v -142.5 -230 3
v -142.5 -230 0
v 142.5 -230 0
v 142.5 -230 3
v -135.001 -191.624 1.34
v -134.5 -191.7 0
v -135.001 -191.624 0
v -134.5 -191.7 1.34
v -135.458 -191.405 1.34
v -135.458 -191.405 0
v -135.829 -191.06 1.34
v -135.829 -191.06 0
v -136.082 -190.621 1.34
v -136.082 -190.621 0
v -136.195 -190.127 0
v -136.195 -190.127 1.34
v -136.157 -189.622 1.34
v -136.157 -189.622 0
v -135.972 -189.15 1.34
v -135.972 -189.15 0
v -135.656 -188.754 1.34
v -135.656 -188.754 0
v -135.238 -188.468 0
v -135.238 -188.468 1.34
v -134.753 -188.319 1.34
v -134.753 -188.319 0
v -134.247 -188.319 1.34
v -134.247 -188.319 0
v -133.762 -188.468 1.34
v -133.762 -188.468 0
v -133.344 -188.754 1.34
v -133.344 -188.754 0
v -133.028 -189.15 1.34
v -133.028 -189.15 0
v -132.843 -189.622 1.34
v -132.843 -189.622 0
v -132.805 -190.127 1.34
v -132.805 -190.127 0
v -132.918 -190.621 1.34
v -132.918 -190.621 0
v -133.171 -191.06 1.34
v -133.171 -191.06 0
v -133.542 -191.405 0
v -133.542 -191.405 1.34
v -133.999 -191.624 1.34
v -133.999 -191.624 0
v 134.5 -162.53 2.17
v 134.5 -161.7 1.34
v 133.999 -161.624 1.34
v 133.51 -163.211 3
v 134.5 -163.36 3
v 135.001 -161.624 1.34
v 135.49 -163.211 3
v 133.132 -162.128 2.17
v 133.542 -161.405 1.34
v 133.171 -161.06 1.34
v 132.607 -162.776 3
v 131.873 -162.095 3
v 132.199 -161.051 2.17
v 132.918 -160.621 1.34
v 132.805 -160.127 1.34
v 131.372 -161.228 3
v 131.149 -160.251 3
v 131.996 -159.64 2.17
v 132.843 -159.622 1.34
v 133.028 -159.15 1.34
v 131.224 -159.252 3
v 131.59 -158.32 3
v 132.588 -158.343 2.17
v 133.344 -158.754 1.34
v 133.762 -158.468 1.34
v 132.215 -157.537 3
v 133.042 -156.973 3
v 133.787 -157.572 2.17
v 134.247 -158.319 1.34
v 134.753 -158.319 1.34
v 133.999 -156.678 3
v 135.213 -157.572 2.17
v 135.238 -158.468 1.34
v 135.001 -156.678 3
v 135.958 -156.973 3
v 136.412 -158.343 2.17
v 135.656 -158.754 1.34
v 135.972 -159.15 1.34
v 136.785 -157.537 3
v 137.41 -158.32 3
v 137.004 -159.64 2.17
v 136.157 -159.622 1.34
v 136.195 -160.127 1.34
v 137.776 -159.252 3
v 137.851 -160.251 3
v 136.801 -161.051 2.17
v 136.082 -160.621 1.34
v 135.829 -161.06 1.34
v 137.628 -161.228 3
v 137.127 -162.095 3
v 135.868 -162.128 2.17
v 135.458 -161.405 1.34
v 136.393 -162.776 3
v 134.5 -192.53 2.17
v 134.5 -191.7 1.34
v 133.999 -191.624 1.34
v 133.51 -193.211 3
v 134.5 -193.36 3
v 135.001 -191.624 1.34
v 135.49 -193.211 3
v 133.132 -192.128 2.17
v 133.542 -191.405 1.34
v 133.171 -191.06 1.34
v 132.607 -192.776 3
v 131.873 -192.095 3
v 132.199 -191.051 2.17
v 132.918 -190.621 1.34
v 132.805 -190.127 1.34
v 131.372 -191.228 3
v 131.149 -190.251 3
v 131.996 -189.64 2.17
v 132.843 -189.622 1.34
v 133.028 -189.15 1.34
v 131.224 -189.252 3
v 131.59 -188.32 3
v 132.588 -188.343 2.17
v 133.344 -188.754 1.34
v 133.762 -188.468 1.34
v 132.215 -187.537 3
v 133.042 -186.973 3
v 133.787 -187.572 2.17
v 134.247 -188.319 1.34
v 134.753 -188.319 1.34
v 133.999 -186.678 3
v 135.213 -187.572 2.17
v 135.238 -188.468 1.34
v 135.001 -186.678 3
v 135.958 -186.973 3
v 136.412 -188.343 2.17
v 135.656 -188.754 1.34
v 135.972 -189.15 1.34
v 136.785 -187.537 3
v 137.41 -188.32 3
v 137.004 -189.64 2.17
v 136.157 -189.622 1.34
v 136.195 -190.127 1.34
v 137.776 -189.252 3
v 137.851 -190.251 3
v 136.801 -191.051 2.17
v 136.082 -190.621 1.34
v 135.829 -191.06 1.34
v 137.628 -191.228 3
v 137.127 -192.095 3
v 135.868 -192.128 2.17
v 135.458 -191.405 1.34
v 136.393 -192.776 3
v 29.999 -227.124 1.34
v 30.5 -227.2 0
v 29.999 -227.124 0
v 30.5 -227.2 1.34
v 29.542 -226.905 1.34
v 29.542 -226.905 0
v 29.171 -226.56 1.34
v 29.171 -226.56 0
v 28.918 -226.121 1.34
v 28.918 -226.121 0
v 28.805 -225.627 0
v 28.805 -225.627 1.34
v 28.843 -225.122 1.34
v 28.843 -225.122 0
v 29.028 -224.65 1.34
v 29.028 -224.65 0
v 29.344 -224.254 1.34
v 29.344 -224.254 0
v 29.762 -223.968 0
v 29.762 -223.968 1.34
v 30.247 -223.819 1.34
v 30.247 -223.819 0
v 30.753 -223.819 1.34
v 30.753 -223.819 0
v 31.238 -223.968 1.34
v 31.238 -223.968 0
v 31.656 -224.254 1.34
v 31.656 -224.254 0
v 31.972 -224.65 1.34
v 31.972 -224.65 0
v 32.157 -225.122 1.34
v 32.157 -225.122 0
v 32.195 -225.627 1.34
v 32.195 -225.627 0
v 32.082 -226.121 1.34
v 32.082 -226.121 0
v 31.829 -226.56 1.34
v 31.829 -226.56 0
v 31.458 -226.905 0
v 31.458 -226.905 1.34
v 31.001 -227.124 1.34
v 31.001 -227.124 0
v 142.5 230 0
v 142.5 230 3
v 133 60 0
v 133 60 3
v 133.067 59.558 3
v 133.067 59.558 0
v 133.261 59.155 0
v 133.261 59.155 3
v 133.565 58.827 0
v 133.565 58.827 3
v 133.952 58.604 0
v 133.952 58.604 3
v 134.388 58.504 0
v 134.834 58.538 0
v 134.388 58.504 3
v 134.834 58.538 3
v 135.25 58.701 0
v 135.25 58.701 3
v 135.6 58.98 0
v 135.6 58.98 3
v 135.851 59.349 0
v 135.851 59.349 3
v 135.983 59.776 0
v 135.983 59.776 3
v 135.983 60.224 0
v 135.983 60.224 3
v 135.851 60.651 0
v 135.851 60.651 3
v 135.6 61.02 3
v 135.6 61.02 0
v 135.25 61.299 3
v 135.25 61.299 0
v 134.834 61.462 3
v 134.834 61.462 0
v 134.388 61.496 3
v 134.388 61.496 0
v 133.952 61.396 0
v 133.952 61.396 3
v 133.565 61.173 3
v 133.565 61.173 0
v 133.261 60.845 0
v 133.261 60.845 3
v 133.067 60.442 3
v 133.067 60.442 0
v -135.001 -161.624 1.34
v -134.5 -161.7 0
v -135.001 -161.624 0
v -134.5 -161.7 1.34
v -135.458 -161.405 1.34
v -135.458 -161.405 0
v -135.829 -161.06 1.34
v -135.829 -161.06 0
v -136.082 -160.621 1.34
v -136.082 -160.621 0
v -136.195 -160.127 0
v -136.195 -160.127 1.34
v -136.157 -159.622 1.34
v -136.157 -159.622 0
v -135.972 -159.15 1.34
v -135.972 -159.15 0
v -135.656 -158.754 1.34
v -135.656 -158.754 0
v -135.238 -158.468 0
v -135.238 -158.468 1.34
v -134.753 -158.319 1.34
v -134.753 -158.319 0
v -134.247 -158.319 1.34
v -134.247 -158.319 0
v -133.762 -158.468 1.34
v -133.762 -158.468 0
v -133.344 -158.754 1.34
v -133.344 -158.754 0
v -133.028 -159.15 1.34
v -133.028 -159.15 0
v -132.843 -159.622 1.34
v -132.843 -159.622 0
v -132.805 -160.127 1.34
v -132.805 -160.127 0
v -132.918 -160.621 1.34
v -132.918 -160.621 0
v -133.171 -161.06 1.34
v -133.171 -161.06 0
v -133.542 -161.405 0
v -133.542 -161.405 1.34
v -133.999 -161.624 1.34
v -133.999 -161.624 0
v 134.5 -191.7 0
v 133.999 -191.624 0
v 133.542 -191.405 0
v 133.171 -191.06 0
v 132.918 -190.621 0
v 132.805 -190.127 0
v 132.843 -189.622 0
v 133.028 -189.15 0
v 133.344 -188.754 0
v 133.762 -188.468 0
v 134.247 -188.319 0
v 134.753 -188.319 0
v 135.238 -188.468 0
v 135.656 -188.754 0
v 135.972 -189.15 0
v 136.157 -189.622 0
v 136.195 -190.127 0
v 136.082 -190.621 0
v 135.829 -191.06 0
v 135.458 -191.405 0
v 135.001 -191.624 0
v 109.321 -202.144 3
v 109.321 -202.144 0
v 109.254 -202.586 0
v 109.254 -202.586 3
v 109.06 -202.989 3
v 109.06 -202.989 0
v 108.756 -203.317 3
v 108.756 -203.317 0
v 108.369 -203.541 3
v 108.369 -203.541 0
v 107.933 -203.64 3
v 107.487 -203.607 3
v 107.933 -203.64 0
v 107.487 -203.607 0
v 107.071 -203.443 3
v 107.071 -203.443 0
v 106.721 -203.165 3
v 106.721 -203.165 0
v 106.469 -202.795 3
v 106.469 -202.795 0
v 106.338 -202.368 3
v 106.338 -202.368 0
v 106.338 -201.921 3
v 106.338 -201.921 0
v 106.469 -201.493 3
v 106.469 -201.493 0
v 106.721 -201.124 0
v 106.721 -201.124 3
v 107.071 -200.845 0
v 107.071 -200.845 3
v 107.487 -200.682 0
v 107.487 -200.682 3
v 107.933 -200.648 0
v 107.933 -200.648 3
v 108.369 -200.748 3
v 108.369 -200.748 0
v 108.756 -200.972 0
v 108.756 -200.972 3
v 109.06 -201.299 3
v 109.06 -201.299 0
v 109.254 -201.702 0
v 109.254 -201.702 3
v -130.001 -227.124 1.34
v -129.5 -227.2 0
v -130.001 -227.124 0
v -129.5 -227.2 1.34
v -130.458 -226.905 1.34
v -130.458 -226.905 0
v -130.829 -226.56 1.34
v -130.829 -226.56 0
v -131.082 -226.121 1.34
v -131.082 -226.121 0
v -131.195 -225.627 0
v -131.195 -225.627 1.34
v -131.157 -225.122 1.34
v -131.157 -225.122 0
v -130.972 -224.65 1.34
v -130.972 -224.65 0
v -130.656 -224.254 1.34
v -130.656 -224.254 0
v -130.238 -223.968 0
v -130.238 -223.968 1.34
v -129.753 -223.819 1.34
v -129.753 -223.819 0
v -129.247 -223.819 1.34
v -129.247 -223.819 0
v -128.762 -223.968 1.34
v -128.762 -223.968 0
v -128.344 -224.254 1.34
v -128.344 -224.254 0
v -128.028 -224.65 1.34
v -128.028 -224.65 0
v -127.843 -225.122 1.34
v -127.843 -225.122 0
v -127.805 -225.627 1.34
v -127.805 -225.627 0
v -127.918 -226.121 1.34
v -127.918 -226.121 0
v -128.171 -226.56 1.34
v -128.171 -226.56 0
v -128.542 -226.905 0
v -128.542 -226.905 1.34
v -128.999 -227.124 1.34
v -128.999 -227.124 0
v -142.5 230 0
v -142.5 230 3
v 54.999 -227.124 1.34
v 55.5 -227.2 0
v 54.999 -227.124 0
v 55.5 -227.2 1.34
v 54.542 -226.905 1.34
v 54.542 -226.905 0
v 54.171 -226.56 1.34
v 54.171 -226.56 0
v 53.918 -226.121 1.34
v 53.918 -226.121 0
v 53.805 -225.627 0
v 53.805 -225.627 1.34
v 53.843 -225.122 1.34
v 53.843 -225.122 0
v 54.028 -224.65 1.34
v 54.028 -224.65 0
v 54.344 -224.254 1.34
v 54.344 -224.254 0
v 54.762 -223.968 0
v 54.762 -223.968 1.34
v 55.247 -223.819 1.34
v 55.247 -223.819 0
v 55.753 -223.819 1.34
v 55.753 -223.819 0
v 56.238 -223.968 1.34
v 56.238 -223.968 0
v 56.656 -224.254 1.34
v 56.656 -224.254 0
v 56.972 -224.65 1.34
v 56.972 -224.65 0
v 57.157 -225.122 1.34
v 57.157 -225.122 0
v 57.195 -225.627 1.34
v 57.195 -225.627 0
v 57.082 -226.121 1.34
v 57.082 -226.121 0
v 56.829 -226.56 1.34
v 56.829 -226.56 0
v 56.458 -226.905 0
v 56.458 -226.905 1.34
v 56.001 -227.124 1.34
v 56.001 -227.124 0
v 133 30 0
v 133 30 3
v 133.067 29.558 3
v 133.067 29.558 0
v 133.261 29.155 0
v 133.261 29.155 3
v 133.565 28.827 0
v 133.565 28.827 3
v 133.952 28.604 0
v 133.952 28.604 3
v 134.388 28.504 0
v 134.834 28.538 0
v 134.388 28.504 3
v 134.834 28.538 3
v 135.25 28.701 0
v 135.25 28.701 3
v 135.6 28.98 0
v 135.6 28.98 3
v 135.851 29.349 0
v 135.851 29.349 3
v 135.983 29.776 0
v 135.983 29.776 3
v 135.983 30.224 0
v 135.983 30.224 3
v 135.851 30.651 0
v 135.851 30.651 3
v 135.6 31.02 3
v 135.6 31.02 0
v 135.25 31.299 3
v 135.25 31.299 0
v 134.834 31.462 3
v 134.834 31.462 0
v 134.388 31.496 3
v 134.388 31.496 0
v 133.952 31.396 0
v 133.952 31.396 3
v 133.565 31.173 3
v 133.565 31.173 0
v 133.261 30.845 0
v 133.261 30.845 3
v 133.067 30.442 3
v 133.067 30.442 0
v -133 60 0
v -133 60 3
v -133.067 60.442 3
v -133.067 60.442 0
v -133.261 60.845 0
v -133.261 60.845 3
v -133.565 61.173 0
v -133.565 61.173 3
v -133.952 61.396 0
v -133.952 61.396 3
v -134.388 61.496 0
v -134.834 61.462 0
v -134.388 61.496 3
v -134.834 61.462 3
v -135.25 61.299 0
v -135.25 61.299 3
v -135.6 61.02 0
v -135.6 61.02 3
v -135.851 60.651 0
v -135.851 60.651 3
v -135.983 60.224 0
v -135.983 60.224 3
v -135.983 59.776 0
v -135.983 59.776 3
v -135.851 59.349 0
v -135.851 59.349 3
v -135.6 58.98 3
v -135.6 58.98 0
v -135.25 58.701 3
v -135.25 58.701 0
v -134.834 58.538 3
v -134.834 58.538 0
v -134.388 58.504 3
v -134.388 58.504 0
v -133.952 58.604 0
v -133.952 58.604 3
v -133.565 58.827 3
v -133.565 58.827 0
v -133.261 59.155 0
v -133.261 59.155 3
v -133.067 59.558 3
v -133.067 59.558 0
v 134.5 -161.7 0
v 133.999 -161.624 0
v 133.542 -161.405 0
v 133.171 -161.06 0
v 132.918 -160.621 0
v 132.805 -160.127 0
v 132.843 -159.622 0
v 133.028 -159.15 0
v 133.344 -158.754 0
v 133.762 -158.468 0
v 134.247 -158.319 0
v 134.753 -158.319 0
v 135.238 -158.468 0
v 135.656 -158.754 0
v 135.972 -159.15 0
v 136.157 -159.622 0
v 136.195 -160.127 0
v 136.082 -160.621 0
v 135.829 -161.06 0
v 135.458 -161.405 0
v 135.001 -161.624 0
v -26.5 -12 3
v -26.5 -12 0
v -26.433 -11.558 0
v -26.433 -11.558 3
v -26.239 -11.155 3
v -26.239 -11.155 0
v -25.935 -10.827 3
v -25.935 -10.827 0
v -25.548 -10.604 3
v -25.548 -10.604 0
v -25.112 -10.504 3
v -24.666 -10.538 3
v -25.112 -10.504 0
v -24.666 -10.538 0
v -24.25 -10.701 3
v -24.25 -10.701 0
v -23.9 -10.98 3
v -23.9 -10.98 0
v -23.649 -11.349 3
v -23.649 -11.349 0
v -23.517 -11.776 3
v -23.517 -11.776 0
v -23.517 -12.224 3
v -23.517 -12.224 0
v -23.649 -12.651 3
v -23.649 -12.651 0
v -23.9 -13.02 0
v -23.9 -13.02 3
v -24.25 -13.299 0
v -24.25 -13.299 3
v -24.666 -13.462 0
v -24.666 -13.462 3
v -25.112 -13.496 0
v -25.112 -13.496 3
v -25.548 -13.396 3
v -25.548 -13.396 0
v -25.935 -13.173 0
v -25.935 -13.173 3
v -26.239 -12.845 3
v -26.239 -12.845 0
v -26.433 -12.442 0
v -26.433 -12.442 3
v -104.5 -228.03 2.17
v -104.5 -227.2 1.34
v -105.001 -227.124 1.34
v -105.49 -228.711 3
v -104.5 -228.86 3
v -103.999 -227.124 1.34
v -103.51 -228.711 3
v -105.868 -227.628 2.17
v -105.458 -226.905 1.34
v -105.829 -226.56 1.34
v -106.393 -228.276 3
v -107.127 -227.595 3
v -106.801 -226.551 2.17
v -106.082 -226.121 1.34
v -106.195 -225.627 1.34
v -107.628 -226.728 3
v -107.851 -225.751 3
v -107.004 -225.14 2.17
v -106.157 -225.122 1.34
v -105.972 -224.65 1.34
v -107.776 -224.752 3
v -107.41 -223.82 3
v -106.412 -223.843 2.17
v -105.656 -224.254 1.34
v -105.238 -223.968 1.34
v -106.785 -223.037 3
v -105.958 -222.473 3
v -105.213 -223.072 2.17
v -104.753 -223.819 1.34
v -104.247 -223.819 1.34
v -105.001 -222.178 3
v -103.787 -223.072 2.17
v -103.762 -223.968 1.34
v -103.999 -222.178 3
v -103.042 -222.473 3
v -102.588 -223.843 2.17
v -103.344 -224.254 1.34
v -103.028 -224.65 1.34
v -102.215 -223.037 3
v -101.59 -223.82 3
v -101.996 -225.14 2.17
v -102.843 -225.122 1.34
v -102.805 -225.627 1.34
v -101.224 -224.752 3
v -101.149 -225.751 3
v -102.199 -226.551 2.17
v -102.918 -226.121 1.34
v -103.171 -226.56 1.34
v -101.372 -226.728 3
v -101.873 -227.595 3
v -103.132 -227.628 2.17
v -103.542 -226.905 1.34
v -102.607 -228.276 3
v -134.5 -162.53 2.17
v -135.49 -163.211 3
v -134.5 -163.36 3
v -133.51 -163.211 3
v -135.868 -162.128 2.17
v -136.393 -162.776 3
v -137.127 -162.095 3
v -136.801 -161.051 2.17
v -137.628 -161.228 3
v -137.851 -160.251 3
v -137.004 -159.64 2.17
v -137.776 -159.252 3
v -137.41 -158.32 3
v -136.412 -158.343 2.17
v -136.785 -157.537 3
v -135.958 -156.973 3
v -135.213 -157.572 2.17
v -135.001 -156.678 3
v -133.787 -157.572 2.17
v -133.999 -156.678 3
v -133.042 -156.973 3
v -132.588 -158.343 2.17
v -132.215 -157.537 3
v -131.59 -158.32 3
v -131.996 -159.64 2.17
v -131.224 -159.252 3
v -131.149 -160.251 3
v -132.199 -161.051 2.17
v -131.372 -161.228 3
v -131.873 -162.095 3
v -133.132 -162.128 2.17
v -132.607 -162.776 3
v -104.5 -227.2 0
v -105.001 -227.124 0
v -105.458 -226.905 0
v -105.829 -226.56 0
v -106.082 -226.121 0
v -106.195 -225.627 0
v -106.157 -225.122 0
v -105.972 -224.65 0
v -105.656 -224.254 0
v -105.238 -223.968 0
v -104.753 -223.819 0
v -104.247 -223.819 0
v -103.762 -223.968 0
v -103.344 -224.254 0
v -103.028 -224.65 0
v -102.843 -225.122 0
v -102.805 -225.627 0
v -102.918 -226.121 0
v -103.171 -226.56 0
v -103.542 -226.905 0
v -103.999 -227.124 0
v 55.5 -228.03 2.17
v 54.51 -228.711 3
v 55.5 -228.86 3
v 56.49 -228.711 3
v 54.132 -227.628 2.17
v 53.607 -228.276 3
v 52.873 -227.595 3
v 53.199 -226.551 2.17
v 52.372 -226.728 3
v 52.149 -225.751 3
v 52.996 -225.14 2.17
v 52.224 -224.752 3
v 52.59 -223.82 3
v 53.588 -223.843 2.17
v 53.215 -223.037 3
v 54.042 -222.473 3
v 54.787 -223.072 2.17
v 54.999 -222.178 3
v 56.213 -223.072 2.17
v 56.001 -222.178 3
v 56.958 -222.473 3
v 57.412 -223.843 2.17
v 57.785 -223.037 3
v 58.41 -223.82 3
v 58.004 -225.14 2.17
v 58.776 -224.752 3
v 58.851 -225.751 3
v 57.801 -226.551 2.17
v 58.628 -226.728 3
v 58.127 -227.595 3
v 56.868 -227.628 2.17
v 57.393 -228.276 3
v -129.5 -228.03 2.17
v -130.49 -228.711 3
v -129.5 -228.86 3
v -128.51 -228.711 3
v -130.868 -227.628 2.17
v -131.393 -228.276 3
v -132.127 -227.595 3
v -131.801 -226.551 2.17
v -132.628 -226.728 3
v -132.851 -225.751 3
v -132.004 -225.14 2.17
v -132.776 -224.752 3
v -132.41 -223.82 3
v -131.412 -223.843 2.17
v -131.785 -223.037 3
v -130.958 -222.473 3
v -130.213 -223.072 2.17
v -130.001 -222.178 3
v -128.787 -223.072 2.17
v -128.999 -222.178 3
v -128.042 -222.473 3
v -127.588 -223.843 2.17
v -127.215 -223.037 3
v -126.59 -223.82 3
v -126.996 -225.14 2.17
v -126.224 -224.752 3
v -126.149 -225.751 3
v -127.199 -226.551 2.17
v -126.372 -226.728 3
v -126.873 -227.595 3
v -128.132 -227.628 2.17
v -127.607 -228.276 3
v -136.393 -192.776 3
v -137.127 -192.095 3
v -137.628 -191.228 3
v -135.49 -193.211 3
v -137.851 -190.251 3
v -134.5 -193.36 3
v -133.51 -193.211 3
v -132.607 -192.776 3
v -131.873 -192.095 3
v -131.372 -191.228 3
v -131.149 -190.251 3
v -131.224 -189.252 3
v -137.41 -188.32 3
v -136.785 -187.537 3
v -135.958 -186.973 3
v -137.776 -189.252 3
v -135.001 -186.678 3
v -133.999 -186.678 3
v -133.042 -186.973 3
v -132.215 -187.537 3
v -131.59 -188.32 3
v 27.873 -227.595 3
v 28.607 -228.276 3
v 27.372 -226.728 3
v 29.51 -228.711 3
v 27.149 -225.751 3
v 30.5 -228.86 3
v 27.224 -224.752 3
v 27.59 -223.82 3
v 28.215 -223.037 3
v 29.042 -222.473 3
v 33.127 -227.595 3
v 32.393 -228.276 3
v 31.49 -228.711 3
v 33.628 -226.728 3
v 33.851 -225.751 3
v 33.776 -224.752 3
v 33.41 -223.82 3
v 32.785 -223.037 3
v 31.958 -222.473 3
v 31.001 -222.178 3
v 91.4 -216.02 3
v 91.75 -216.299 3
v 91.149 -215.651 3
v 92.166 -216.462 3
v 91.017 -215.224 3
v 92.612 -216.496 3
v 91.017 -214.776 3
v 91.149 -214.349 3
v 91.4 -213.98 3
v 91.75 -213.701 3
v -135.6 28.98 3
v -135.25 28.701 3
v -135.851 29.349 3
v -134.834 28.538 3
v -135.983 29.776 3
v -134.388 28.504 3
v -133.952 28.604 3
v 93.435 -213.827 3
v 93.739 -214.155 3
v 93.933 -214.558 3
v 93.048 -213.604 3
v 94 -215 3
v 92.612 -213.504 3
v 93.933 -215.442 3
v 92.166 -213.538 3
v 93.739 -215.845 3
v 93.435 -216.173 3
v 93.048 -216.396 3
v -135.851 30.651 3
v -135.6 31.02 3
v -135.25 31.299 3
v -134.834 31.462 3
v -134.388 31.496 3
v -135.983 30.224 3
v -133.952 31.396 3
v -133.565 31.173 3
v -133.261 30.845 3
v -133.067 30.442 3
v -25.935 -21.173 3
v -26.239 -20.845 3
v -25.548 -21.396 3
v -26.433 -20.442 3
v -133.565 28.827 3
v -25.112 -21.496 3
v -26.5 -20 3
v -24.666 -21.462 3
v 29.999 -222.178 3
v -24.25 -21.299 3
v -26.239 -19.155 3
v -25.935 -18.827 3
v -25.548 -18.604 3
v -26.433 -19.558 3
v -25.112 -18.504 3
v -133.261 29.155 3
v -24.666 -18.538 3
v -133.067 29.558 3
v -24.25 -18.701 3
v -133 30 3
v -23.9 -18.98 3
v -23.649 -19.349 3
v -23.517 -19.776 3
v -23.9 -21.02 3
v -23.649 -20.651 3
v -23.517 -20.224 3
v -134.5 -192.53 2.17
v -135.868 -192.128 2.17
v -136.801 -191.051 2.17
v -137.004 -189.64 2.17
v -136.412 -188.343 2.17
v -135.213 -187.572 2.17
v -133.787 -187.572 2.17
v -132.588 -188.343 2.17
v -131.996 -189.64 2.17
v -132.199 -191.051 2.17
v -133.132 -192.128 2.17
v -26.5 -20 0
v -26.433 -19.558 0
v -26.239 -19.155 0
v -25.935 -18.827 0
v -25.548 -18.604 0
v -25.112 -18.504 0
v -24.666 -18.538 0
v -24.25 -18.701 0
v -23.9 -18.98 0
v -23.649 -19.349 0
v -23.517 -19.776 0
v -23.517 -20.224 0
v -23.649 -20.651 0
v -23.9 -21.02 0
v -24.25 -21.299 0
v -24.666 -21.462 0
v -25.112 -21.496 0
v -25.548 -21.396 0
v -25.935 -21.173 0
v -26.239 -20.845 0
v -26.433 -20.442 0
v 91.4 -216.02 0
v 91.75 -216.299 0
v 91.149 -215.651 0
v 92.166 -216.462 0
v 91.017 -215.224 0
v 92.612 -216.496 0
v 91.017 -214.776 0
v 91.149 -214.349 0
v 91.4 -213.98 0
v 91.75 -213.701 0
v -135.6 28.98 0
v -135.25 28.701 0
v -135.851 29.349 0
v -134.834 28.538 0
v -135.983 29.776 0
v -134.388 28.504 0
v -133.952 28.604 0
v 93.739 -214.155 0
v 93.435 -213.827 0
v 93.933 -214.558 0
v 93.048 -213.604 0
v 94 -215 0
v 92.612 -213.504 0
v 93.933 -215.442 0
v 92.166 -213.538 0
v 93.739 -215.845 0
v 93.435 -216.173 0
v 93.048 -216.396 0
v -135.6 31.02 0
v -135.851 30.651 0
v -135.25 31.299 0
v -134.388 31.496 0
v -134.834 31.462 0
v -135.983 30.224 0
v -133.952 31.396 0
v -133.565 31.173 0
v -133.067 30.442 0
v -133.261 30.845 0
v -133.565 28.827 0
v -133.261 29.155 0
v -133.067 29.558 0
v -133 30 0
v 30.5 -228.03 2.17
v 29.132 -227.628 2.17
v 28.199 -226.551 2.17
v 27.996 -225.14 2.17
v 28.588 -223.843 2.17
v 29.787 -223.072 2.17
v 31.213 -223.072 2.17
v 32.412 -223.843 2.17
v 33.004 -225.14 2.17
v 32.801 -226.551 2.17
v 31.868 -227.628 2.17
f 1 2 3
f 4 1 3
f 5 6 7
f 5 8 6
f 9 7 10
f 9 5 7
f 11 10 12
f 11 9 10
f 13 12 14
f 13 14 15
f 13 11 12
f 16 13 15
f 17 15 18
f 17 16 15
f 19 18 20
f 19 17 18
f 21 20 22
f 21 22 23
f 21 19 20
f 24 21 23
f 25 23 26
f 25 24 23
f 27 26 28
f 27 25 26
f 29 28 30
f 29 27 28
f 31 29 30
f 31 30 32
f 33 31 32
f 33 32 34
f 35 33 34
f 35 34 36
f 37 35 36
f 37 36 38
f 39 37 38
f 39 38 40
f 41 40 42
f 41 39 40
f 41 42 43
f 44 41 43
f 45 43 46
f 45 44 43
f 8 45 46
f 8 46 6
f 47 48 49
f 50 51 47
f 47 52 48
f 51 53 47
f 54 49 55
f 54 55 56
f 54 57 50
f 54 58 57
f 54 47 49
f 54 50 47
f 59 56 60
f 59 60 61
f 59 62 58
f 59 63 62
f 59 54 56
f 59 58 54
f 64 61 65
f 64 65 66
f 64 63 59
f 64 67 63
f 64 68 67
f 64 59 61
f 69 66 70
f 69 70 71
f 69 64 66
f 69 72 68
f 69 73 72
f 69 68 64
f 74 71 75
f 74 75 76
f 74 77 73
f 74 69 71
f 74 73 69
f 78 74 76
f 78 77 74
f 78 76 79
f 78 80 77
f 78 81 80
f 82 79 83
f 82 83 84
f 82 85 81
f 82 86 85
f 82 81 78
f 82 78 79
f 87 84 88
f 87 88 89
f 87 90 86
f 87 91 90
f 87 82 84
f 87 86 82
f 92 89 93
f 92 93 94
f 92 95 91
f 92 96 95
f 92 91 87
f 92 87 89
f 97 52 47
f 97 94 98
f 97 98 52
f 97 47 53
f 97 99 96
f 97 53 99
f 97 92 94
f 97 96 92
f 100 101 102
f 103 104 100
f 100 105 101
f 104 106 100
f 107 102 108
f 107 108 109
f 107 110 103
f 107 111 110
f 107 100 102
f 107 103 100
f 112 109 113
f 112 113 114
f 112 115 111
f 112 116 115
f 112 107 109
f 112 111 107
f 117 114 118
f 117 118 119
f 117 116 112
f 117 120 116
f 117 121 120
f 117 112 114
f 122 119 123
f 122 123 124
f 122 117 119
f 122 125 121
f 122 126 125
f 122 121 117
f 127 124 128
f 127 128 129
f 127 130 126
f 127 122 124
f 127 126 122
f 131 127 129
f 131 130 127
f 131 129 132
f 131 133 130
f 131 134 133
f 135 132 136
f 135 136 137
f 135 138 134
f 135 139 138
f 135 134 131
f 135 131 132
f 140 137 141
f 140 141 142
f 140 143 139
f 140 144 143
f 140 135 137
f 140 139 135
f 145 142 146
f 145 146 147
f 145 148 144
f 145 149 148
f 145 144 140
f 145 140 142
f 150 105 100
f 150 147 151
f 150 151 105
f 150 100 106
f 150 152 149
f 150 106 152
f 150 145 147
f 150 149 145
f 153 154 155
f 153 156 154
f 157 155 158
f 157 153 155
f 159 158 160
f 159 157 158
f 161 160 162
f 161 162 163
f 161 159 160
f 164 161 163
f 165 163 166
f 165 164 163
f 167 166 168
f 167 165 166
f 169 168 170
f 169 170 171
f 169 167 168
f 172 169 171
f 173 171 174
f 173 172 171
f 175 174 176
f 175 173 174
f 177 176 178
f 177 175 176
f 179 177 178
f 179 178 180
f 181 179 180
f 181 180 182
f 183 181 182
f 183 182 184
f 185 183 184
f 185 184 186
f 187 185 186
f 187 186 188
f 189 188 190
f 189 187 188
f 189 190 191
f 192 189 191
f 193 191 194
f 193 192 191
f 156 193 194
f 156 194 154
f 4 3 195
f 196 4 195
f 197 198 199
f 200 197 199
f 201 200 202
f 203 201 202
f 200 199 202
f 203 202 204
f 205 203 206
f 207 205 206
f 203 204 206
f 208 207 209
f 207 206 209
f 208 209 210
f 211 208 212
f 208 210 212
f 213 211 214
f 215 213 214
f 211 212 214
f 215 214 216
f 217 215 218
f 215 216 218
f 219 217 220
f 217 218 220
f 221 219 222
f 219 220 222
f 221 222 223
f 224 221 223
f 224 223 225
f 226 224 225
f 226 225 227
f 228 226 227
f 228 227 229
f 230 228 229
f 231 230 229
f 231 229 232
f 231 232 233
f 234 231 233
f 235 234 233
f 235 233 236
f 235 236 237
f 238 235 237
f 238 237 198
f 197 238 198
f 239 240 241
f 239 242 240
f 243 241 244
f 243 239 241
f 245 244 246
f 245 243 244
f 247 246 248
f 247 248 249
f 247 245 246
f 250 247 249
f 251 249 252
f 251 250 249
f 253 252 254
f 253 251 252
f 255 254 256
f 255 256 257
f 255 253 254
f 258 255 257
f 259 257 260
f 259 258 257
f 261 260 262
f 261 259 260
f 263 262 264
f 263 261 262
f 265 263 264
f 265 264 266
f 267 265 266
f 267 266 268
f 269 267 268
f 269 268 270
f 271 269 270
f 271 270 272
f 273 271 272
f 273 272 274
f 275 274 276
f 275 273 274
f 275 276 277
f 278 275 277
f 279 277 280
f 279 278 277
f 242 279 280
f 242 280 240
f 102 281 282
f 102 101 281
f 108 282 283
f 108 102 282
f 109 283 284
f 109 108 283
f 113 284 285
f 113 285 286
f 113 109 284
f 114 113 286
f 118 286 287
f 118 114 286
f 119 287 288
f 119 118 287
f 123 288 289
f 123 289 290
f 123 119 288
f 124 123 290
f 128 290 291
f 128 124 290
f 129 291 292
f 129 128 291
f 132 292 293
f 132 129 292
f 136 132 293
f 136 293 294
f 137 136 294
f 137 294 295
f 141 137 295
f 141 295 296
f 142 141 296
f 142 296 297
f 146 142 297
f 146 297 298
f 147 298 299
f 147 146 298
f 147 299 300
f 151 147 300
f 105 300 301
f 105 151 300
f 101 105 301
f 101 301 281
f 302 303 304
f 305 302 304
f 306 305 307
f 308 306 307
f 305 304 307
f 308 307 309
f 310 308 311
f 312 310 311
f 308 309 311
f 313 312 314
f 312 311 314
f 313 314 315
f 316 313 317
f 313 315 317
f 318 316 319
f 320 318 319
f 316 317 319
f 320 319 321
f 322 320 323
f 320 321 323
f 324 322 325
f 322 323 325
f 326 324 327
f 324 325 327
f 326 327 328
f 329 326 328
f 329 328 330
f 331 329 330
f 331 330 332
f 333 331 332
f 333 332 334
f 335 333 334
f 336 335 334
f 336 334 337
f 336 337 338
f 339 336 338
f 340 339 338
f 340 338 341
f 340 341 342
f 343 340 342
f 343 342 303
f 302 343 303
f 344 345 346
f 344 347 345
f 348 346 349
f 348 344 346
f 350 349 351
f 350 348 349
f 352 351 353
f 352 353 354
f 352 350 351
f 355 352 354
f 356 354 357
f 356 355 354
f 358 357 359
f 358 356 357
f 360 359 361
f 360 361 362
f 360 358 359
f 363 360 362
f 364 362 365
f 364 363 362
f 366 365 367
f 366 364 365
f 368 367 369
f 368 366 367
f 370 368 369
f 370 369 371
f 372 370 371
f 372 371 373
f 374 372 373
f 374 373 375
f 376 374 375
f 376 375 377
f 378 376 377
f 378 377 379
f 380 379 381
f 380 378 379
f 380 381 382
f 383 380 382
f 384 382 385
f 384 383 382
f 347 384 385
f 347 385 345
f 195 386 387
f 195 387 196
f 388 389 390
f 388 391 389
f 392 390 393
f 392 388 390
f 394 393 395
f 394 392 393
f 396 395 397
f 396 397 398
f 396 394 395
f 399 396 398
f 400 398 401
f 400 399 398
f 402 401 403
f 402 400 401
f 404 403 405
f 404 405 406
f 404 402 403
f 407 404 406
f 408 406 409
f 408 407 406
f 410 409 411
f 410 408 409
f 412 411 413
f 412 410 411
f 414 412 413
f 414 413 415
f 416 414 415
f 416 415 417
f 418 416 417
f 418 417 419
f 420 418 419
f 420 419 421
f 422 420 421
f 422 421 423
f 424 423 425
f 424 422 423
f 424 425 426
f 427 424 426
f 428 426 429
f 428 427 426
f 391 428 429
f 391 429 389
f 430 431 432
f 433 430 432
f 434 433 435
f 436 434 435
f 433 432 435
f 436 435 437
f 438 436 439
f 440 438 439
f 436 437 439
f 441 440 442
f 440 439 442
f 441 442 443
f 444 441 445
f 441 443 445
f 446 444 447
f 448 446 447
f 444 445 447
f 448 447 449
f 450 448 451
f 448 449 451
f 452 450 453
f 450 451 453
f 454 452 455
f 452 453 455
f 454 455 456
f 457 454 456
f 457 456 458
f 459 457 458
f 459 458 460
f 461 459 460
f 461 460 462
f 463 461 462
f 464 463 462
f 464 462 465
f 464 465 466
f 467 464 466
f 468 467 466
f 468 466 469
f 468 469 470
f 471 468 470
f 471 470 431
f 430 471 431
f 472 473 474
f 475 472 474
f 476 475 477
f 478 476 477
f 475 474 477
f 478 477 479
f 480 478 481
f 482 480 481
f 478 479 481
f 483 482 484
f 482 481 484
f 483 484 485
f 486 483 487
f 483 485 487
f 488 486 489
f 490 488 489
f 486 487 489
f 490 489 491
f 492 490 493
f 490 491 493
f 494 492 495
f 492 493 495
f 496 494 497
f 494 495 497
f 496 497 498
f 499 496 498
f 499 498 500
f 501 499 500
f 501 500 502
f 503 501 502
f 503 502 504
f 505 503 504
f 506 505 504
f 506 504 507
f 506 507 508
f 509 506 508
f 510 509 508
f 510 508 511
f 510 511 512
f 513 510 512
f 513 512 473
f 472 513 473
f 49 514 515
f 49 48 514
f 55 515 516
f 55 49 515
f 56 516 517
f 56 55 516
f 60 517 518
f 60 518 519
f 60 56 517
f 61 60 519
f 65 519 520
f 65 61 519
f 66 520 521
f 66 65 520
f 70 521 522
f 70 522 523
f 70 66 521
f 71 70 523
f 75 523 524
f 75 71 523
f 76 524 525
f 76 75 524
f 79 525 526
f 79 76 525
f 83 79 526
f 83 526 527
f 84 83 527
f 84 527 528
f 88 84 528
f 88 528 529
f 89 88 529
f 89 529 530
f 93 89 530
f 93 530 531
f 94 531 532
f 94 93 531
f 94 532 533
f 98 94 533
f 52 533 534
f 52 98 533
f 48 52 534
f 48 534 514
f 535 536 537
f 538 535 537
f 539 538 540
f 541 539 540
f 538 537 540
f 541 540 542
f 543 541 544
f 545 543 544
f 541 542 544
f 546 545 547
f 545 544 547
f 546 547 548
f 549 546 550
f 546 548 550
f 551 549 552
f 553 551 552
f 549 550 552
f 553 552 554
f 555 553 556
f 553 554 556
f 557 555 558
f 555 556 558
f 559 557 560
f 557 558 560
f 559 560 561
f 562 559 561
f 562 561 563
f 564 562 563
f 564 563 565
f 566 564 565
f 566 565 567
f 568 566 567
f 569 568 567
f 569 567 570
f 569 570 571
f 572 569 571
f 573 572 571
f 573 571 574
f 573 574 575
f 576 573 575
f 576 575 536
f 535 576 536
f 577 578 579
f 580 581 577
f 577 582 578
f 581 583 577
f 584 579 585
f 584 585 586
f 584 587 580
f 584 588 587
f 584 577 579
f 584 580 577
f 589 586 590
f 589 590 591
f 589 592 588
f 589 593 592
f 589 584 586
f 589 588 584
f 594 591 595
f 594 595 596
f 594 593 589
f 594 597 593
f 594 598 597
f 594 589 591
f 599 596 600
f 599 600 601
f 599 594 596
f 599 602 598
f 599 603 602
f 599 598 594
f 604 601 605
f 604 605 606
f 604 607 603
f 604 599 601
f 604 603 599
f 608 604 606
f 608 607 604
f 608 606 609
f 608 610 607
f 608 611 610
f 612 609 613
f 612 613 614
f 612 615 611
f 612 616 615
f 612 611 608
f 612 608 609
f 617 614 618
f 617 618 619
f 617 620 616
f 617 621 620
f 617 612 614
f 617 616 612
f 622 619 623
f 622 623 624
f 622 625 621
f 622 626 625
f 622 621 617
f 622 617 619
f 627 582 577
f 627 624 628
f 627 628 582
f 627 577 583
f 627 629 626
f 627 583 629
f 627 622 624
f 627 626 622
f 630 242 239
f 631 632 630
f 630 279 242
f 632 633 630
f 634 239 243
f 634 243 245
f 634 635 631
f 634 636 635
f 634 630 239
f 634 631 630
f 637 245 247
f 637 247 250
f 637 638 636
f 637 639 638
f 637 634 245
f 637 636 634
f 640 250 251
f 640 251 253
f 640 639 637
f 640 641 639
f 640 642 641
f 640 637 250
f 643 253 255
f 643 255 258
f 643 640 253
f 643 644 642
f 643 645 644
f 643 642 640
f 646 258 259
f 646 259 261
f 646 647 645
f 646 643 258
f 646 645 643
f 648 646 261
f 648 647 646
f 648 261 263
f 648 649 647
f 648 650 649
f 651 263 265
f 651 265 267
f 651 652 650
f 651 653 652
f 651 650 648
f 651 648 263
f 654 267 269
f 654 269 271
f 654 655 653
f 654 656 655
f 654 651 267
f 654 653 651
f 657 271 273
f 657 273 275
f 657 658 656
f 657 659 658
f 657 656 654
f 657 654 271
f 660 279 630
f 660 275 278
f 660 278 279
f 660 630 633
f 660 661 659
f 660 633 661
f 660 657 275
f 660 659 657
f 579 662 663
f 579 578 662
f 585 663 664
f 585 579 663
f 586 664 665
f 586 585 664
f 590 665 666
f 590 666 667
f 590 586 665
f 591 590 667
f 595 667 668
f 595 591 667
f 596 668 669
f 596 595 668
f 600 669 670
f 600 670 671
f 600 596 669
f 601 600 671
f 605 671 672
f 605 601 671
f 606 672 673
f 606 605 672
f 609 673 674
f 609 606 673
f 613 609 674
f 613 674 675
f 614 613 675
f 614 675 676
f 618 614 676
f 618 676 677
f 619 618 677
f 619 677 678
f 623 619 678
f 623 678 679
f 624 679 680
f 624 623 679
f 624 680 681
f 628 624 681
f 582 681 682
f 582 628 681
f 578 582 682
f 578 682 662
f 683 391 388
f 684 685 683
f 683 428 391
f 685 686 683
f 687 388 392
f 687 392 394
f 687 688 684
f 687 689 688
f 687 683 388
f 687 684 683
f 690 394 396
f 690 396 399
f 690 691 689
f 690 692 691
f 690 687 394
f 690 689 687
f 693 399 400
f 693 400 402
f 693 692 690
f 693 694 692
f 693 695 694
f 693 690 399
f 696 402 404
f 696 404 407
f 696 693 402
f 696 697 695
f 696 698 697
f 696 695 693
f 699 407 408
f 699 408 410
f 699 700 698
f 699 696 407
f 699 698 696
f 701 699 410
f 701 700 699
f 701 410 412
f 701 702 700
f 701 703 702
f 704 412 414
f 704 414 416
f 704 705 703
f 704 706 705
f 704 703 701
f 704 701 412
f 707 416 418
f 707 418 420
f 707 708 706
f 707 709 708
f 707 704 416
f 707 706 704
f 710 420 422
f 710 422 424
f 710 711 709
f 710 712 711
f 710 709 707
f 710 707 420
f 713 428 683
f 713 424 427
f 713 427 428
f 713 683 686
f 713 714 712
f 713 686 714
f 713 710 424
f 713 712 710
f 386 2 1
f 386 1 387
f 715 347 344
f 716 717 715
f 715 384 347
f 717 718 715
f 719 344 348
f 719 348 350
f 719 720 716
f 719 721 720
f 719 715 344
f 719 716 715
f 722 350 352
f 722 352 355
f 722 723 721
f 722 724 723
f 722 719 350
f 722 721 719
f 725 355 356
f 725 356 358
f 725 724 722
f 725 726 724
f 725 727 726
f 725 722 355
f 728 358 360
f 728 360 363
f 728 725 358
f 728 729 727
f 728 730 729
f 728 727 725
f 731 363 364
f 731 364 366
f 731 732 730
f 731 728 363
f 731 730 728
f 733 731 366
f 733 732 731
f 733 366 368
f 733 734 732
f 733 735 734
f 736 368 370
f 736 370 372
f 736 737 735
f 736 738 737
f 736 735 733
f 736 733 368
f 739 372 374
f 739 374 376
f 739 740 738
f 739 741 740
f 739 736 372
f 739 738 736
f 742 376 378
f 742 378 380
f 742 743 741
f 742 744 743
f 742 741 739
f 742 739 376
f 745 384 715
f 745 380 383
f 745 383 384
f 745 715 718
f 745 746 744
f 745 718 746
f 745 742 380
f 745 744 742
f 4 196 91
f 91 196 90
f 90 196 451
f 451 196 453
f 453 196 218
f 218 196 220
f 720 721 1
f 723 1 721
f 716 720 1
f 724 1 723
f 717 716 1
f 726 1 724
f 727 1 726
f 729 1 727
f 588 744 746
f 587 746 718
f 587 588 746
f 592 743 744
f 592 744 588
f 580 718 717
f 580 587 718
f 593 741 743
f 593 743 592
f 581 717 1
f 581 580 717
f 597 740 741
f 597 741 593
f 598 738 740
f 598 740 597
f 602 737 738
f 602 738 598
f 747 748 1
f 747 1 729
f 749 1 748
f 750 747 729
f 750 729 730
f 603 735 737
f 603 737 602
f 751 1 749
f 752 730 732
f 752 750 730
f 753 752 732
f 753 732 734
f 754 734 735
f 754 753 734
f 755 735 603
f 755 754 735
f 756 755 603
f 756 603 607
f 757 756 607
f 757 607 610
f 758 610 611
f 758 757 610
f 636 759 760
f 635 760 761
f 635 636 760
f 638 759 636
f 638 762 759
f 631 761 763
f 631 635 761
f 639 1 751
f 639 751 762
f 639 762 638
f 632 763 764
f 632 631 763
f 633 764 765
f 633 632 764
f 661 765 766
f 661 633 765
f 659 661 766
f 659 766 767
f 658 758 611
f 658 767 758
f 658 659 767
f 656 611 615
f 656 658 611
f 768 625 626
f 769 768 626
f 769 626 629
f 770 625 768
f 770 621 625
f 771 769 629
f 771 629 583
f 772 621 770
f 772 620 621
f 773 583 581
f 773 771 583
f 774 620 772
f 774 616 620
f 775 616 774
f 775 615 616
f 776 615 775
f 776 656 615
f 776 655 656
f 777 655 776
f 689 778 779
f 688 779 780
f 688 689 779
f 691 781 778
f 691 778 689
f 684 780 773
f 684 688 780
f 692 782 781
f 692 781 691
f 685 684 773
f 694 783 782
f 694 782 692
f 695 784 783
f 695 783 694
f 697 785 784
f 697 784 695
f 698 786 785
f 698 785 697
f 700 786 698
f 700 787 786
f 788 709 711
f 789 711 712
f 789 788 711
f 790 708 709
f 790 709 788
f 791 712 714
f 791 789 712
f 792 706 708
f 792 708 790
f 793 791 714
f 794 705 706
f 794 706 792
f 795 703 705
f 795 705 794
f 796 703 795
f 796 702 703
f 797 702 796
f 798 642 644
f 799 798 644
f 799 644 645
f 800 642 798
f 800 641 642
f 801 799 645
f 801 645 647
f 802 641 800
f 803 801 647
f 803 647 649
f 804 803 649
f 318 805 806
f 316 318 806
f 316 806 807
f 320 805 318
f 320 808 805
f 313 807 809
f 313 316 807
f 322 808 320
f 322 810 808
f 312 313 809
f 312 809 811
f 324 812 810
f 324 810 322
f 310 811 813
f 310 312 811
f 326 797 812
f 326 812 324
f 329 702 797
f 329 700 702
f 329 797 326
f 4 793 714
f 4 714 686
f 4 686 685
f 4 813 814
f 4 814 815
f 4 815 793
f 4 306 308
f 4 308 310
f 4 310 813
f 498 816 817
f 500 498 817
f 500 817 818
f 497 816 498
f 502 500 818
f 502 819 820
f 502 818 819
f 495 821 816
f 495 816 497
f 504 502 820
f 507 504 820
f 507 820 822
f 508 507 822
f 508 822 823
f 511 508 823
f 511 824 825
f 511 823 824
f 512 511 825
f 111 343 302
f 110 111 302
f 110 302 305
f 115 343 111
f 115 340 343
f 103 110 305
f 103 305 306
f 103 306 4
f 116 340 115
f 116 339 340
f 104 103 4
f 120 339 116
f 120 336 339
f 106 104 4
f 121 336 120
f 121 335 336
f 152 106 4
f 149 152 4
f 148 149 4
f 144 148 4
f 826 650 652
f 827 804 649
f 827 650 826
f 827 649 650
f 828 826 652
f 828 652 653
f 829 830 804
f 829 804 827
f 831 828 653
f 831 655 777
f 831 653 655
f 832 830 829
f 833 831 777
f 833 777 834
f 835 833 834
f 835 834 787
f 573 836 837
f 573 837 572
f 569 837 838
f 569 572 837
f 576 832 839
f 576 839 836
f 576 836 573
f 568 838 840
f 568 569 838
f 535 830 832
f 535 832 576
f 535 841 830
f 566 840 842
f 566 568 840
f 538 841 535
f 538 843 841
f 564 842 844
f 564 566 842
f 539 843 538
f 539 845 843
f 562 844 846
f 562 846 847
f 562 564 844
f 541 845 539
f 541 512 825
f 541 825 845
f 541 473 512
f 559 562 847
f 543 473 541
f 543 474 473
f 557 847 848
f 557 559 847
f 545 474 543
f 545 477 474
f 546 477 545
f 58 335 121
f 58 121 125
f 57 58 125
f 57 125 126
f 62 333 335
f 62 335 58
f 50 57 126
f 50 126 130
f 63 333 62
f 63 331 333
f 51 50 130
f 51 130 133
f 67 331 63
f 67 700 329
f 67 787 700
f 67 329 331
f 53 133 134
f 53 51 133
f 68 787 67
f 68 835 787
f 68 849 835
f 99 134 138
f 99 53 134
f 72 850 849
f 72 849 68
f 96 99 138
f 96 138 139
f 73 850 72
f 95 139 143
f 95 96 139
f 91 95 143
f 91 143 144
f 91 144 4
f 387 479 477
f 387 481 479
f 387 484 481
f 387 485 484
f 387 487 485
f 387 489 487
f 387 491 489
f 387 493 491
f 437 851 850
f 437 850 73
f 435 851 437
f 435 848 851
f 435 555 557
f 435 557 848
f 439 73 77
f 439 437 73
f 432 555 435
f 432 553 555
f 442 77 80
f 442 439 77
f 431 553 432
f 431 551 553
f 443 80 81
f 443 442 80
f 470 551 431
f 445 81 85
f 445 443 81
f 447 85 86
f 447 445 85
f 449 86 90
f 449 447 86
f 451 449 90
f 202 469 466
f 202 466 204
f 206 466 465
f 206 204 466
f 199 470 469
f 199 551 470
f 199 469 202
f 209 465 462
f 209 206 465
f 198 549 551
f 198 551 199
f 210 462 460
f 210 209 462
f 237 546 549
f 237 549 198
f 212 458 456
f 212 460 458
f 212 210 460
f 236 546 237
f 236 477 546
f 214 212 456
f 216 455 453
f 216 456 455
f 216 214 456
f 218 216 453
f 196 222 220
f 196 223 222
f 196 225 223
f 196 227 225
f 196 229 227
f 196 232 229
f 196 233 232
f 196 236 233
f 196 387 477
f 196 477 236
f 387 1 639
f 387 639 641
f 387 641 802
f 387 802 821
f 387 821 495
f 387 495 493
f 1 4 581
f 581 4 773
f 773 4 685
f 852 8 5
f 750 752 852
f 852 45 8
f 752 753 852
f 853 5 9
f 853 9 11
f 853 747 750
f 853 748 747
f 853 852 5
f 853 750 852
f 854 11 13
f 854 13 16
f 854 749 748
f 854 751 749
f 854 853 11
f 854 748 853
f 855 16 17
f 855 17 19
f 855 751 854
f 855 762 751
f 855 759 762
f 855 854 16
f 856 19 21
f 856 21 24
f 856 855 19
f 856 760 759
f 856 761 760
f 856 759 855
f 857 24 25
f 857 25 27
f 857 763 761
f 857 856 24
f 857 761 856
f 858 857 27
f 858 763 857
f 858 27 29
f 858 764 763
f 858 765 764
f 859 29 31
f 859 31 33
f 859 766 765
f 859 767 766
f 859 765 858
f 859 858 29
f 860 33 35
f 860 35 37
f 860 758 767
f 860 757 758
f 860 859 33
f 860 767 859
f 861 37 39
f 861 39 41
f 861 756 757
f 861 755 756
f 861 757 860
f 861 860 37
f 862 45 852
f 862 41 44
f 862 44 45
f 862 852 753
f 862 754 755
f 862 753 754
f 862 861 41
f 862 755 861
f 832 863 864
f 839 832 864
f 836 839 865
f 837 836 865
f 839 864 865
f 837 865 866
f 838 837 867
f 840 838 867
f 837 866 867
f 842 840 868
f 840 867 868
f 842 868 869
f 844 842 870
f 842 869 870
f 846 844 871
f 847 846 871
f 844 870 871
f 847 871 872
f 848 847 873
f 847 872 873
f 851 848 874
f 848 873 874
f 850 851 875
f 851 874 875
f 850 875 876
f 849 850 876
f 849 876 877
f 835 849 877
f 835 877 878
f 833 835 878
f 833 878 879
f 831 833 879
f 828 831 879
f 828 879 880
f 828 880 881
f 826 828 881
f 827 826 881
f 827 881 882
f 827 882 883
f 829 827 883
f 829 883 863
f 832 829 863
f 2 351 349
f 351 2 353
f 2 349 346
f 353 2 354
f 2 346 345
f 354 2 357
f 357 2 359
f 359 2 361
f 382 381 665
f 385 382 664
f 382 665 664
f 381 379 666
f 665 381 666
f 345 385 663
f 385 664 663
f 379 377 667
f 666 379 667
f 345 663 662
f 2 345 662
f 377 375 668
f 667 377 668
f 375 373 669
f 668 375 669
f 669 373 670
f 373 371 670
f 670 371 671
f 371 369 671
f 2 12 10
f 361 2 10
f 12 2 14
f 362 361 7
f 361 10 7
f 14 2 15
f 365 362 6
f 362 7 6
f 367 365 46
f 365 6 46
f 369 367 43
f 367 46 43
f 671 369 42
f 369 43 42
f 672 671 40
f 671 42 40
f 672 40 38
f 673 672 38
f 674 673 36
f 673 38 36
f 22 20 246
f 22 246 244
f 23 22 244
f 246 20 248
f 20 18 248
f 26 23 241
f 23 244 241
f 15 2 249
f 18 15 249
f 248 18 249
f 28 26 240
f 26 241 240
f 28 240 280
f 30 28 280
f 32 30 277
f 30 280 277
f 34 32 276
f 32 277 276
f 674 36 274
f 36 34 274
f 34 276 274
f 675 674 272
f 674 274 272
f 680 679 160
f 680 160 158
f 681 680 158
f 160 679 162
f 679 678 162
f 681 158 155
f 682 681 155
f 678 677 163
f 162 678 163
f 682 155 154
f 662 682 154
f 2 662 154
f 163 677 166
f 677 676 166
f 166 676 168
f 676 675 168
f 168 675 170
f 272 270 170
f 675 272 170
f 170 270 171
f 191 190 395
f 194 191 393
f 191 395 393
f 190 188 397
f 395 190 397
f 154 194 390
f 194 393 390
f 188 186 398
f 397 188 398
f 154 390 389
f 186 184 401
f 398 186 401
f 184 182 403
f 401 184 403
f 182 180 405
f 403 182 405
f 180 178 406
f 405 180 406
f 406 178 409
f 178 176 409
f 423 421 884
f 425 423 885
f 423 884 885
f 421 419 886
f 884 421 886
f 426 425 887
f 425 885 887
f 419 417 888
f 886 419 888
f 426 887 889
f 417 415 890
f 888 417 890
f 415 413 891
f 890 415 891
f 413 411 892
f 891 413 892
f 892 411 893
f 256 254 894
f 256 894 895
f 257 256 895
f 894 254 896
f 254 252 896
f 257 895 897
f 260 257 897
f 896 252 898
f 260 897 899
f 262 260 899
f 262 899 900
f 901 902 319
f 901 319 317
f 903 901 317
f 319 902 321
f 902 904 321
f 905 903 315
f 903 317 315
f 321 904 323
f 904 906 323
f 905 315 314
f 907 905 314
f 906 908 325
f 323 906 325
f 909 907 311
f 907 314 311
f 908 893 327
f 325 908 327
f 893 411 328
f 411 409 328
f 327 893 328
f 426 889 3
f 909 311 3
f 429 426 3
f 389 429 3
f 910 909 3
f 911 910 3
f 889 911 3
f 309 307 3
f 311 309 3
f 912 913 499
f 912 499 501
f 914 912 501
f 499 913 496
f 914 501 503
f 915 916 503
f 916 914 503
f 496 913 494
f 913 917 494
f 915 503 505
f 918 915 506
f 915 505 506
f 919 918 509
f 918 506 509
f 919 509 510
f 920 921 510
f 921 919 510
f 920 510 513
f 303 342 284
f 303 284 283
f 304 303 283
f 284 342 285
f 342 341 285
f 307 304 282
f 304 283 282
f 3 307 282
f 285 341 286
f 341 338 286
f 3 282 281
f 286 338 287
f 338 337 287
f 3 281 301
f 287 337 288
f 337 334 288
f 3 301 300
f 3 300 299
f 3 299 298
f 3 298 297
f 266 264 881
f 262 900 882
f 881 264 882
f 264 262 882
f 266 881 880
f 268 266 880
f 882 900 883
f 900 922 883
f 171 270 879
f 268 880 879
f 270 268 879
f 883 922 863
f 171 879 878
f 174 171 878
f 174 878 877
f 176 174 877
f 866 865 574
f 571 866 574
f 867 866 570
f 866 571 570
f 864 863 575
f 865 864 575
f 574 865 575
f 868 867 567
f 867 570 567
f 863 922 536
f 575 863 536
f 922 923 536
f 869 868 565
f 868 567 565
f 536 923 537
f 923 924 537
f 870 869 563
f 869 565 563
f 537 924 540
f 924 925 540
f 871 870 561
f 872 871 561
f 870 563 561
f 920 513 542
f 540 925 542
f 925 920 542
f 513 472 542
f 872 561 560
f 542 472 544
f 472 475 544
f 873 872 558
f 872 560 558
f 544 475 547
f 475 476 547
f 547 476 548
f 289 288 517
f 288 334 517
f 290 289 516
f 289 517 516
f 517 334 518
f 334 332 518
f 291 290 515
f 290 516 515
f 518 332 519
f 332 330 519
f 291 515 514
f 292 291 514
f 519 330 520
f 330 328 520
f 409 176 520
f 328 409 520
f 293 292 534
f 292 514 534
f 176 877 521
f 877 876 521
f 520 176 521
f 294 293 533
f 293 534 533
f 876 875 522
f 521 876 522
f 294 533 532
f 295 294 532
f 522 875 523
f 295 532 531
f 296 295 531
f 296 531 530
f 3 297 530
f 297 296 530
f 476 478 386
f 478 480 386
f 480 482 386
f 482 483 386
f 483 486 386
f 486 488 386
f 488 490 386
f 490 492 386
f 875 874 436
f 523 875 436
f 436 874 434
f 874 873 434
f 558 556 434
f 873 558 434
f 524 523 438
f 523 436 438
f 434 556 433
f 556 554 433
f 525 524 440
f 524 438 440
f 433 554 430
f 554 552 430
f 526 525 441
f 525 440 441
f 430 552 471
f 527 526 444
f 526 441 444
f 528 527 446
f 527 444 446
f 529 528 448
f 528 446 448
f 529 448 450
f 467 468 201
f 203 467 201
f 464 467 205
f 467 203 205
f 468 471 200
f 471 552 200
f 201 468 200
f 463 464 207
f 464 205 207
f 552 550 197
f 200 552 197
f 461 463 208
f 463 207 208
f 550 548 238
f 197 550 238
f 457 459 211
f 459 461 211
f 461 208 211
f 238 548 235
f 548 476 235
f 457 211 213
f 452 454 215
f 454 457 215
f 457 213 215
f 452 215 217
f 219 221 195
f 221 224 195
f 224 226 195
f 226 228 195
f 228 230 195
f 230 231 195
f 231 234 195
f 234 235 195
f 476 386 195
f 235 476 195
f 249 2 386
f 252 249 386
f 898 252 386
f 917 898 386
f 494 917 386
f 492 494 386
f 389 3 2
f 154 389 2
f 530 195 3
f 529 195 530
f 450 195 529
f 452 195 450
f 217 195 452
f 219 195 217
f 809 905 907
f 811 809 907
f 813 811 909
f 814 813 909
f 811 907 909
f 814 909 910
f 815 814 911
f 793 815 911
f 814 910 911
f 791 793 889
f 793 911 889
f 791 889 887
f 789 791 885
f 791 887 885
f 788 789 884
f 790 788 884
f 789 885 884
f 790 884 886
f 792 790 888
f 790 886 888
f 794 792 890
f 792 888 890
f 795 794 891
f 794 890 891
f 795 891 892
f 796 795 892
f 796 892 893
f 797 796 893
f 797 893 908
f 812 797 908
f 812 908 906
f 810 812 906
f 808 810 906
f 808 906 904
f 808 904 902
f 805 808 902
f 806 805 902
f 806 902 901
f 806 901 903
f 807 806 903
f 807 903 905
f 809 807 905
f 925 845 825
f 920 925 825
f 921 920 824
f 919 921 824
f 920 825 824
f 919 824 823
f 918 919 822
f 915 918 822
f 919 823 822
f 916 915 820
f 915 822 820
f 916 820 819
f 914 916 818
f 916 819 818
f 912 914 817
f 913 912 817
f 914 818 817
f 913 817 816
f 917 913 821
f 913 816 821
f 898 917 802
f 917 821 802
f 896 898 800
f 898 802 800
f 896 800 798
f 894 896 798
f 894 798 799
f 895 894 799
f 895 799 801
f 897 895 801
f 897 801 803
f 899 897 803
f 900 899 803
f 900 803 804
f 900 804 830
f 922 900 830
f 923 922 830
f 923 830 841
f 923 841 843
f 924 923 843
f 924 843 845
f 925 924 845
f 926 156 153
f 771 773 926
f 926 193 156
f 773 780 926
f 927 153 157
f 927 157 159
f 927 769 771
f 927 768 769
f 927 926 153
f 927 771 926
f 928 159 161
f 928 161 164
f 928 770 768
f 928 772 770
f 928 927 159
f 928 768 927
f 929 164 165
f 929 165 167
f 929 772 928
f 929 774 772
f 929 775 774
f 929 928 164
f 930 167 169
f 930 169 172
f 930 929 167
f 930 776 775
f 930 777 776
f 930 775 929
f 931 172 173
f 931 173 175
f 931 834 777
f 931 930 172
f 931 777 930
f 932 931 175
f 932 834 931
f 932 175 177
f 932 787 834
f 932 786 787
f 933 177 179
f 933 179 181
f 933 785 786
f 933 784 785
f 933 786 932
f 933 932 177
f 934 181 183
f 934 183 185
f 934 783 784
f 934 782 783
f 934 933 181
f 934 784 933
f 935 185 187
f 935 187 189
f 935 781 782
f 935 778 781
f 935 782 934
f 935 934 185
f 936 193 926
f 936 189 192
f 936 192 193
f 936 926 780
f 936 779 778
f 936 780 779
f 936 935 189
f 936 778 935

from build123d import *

# Parameters (mm, degrees)
SKETCH_1_W                  = 285
SKETCH_1_H                  = 460
EXTRUDE_1_DEPTH             = 3
SKETCH_2_R                  = 1.5
CUT_EXTRUDE_1_DEPTH         = 271.583166513
SKETCH_4_R                  = 1.5
CUT_EXTRUDE_2_DEPTH         = 271.583166513
SKETCH_6_R                  = 1.5
CUT_EXTRUDE_3_DEPTH         = 271.583166513
SKETCH_8_R                  = 1.5
CUT_EXTRUDE_5_DEPTH         = 271.583166513
HOLE_WIZARD_M3_1_AT_2_COUNT = 2
HOLE_WIZARD_M3_1_AT_2_PITCH = 30
HOLE_WIZARD_M3_1_AT_3_COUNT = 2
HOLE_WIZARD_M3_1_AT_3_PITCH = 269
HOLE_WIZARD_M3_1_AT_4_COUNT = 2
HOLE_WIZARD_M3_1_AT_4_PITCH = 270.667692937
HOLE_WIZARD_M3_1_AT_5_COUNT = 2
HOLE_WIZARD_M3_1_AT_5_PITCH = 65.690562488
HOLE_WIZARD_M3_1_AT_6_COUNT = 2
HOLE_WIZARD_M3_1_AT_6_PITCH = 72.043389704
HOLE_WIZARD_M3_1_AT_7_COUNT = 2
HOLE_WIZARD_M3_1_AT_7_PITCH = 177.525350302
HOLE_WIZARD_M3_1_AT_8_COUNT = 2
HOLE_WIZARD_M3_1_AT_8_PITCH = 200.973256927


with BuildPart() as part:
    # 草图1 → 凸台-拉伸1 (new body)
    with BuildSketch(Plane.XY):
        Rectangle(SKETCH_1_W, SKETCH_1_H)
    extrude(amount=EXTRUDE_1_DEPTH)

    # 草图2 → 切除-拉伸1 (cut, through all)
    with BuildSketch(Plane.XY.offset(3)):
        with Locations((-134.5, -190)):
            Circle(SKETCH_2_R)
        with Locations(Location((134.5, -190, 0), (0, 0, 180))):
            Circle(SKETCH_2_R)
        with Locations((-134.5, -160)):
            Circle(SKETCH_2_R)
        with Locations(Location((134.5, -160, 0), (0, 0, 180))):
            Circle(SKETCH_2_R)
        with Locations((-134.5, 30)):
            Circle(SKETCH_2_R)
        with Locations(Location((134.5, 30, 0), (0, 0, 180))):
            Circle(SKETCH_2_R)
        with Locations((-134.5, 60)):
            Circle(SKETCH_2_R)
        with Locations(Location((134.5, 60, 0), (0, 0, 180))):
            Circle(SKETCH_2_R)
    extrude(amount=-CUT_EXTRUDE_1_DEPTH, mode=Mode.SUBTRACT)

    # 草图4 → 切除-拉伸2 (cut, through all)
    with BuildSketch(Plane.XY.offset(3)):
        with Locations((-129.5, -225.5)):
            Circle(SKETCH_4_R)
        with Locations((-104.5, -225.5)):
            Circle(SKETCH_4_R)
        with Locations(Location((30.5, -225.5, 0), (0, 0, 180))):
            Circle(SKETCH_4_R)
        with Locations(Location((55.5, -225.5, 0), (0, 0, 180))):
            Circle(SKETCH_4_R)
    extrude(amount=-CUT_EXTRUDE_2_DEPTH, mode=Mode.SUBTRACT)

    # 草图6 → 切除-拉伸3 (cut, through all)
    with BuildSketch(Plane(origin=(0, 0, 0), x_dir=(-1, 0, 0), z_dir=(0, 0, -1))):
        with Locations((25, -20)):
            Circle(SKETCH_6_R)
        with Locations((25, -12)):
            Circle(SKETCH_6_R)
    extrude(amount=-CUT_EXTRUDE_3_DEPTH, mode=Mode.SUBTRACT)

    # 草图8 → 切除-拉伸5 (cut, through all)
    with BuildSketch(Plane(origin=(0, 0, 0), x_dir=(-1, 0, 0), z_dir=(0, 0, -1))):
        with Locations(Location((-107.820888862, -202.144247806, 0), (0, 0, 180))):
            Circle(SKETCH_8_R)
        with Locations(Location((-92.5, -215, 0), (0, 0, 180))):
            Circle(SKETCH_8_R)
    extrude(amount=-CUT_EXTRUDE_5_DEPTH, mode=Mode.SUBTRACT)

    # 草图9 → M3 六角凹锥坑螺钉的锥形沉头孔1 (revolve, cut)
    with BuildSketch(Plane(origin=(-134.5, -160, 3), x_dir=(0, -1, 0), z_dir=(1, 0, 0))):
        Polygon((0, 0), (0, 3), (1.7, 3), (1.7, 1.66), (3.36, 0), align=None)
    hole_wizard_m3_1 = revolve(axis=Axis((-134.5, -160, 9.35), (0, 0, -1)), mode=Mode.SUBTRACT)

    # M3 六角凹锥坑螺钉的锥形沉头孔1 at 2: M3 六角凹锥坑螺钉的锥形沉头孔1 ×2
    with Locations(*[(0, -i * HOLE_WIZARD_M3_1_AT_2_PITCH, 0) for i in range(1, HOLE_WIZARD_M3_1_AT_2_COUNT)]):
        add(hole_wizard_m3_1, mode=Mode.SUBTRACT)

    # M3 六角凹锥坑螺钉的锥形沉头孔1 at 3: M3 六角凹锥坑螺钉的锥形沉头孔1 ×2
    with Locations(*[(i * HOLE_WIZARD_M3_1_AT_3_PITCH, 0, 0) for i in range(1, HOLE_WIZARD_M3_1_AT_3_COUNT)]):
        add(hole_wizard_m3_1, mode=Mode.SUBTRACT)

    # M3 六角凹锥坑螺钉的锥形沉头孔1 at 4: M3 六角凹锥坑螺钉的锥形沉头孔1 ×2
    with Locations(*[Vector(0.993838596253579, -0.11083701816954397, 0) * (i * HOLE_WIZARD_M3_1_AT_4_PITCH) for i in range(1, HOLE_WIZARD_M3_1_AT_4_COUNT)]):
        add(hole_wizard_m3_1, mode=Mode.SUBTRACT)

    # M3 六角凹锥坑螺钉的锥形沉头孔1 at 5: M3 六角凹锥坑螺钉的锥形沉头孔1 ×2
    with Locations(*[Vector(0.0761144342599819, -0.997099088805763, 0) * (i * HOLE_WIZARD_M3_1_AT_5_PITCH) for i in range(1, HOLE_WIZARD_M3_1_AT_5_COUNT)]):
        add(hole_wizard_m3_1, mode=Mode.SUBTRACT)

    # M3 六角凹锥坑螺钉的锥形沉头孔1 at 6: M3 六角凹锥坑螺钉的锥形沉头孔1 ×2
    with Locations(*[Vector(0.41641572007343935, -0.909174322160343, 0) * (i * HOLE_WIZARD_M3_1_AT_6_PITCH) for i in range(1, HOLE_WIZARD_M3_1_AT_6_COUNT)]):
        add(hole_wizard_m3_1, mode=Mode.SUBTRACT)

    # M3 六角凹锥坑螺钉的锥形沉头孔1 at 7: M3 六角凹锥坑螺钉的锥形沉头孔1 ×2
    with Locations(*[Vector(0.9294447227897835, -0.36896138995594435, 0) * (i * HOLE_WIZARD_M3_1_AT_7_PITCH) for i in range(1, HOLE_WIZARD_M3_1_AT_7_COUNT)]):
        add(hole_wizard_m3_1, mode=Mode.SUBTRACT)

    # M3 六角凹锥坑螺钉的锥形沉头孔1 at 8: M3 六角凹锥坑螺钉的锥形沉头孔1 ×2
    with Locations(*[Vector(0.9453994173396505, -0.32591400966182693, 0) * (i * HOLE_WIZARD_M3_1_AT_8_PITCH) for i in range(1, HOLE_WIZARD_M3_1_AT_8_COUNT)]):
        add(hole_wizard_m3_1, mode=Mode.SUBTRACT)


solid = part.part
